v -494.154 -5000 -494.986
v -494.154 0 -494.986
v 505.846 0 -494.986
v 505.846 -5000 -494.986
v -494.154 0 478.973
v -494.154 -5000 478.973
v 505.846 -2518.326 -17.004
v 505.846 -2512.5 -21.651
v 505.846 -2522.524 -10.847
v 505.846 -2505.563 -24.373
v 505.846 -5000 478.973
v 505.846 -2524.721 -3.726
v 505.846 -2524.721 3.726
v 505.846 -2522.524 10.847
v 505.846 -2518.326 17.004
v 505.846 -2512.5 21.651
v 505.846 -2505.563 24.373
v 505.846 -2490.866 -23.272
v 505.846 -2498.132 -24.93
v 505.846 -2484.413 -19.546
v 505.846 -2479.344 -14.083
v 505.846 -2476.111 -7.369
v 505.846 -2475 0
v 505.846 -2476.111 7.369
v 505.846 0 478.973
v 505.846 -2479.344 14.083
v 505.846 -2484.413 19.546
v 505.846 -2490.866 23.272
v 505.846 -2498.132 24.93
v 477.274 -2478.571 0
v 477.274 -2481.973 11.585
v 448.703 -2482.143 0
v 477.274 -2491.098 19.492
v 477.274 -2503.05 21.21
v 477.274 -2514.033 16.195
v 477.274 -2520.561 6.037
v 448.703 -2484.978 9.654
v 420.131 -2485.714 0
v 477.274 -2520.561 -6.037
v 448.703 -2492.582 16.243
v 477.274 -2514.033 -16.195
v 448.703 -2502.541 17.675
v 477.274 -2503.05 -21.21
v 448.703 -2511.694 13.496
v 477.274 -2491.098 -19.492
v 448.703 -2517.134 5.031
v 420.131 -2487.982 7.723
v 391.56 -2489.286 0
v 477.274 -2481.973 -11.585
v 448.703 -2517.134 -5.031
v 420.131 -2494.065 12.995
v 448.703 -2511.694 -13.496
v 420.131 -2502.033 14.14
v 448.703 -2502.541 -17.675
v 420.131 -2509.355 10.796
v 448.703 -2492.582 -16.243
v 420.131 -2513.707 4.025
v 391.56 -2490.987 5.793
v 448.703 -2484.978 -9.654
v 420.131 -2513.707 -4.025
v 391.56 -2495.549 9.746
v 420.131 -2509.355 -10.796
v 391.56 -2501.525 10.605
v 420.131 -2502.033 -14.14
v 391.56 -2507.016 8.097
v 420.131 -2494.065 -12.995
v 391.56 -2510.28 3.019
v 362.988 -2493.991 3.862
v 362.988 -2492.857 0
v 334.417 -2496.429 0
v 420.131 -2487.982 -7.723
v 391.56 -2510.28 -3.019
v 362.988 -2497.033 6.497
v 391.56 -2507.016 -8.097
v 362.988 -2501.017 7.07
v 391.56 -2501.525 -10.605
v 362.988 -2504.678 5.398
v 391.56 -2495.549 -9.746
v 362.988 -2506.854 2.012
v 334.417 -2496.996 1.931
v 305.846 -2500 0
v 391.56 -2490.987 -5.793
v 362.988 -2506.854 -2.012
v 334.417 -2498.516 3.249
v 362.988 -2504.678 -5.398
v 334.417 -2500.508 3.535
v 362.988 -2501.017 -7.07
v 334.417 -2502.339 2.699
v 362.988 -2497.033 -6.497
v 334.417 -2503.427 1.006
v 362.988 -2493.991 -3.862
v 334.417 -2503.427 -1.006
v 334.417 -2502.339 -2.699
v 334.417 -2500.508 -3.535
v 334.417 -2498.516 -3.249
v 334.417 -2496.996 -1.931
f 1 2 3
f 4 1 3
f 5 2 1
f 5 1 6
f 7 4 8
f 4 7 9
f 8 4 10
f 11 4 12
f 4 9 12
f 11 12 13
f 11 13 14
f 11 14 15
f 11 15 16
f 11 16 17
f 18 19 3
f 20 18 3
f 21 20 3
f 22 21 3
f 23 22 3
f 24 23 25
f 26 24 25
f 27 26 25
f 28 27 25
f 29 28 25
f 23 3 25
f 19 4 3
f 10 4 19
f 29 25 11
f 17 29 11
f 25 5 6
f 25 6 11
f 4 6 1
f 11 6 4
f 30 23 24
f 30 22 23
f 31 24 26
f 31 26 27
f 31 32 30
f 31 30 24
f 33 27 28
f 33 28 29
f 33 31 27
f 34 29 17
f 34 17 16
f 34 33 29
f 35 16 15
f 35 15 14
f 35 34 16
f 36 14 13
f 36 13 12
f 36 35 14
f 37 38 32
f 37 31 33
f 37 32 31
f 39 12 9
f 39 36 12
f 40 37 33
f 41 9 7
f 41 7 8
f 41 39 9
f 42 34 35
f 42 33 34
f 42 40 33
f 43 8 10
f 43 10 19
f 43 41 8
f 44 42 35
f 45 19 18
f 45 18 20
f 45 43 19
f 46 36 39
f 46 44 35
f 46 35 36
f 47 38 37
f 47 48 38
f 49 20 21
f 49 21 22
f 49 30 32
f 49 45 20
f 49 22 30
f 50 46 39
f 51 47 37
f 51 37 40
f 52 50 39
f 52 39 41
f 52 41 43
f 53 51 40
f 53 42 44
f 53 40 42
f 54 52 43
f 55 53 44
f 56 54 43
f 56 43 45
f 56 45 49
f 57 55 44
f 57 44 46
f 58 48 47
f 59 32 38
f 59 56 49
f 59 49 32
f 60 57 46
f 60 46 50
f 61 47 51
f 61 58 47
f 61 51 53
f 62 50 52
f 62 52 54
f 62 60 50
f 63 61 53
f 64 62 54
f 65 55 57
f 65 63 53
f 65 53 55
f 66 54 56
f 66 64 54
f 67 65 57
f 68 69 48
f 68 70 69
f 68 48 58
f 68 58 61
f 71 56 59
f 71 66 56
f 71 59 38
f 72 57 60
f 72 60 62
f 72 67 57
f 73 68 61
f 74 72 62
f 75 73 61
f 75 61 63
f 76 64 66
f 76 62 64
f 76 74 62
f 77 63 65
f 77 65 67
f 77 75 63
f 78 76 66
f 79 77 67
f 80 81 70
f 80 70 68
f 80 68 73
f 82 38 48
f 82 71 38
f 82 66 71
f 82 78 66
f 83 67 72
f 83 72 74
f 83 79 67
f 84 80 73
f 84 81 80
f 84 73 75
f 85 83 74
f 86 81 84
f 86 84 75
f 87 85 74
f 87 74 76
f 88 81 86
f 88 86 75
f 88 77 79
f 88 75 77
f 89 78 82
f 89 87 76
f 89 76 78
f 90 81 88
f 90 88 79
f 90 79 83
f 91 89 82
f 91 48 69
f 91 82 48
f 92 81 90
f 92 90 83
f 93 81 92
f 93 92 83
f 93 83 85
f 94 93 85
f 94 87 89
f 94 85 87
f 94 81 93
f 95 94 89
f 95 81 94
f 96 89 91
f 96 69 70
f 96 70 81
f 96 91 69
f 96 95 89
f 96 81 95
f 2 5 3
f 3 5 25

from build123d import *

# Parameters (mm, degrees)
F0_W     = 1000
F0_H     = 973.958764
F1_DEPTH = 5000


with BuildPart() as f1:
    # F0 (on Front) → F1 (new body)
    with BuildSketch(Plane.XZ):
        with Locations((5.845503, -8.006848)):
            Rectangle(F0_W, F0_H)
    extrude(amount=F1_DEPTH)

    # F3 (on Top) → F4 (revolve, cut)
    with BuildSketch(Plane.XY):
        Polygon((305.845503, -2500), (505.845503, -2500), (505.845503, -2475), align=None)
    revolve(axis=Axis((405.845503, -2500, 0), (1, 0, 0)), mode=Mode.SUBTRACT)


solid = f1.part
